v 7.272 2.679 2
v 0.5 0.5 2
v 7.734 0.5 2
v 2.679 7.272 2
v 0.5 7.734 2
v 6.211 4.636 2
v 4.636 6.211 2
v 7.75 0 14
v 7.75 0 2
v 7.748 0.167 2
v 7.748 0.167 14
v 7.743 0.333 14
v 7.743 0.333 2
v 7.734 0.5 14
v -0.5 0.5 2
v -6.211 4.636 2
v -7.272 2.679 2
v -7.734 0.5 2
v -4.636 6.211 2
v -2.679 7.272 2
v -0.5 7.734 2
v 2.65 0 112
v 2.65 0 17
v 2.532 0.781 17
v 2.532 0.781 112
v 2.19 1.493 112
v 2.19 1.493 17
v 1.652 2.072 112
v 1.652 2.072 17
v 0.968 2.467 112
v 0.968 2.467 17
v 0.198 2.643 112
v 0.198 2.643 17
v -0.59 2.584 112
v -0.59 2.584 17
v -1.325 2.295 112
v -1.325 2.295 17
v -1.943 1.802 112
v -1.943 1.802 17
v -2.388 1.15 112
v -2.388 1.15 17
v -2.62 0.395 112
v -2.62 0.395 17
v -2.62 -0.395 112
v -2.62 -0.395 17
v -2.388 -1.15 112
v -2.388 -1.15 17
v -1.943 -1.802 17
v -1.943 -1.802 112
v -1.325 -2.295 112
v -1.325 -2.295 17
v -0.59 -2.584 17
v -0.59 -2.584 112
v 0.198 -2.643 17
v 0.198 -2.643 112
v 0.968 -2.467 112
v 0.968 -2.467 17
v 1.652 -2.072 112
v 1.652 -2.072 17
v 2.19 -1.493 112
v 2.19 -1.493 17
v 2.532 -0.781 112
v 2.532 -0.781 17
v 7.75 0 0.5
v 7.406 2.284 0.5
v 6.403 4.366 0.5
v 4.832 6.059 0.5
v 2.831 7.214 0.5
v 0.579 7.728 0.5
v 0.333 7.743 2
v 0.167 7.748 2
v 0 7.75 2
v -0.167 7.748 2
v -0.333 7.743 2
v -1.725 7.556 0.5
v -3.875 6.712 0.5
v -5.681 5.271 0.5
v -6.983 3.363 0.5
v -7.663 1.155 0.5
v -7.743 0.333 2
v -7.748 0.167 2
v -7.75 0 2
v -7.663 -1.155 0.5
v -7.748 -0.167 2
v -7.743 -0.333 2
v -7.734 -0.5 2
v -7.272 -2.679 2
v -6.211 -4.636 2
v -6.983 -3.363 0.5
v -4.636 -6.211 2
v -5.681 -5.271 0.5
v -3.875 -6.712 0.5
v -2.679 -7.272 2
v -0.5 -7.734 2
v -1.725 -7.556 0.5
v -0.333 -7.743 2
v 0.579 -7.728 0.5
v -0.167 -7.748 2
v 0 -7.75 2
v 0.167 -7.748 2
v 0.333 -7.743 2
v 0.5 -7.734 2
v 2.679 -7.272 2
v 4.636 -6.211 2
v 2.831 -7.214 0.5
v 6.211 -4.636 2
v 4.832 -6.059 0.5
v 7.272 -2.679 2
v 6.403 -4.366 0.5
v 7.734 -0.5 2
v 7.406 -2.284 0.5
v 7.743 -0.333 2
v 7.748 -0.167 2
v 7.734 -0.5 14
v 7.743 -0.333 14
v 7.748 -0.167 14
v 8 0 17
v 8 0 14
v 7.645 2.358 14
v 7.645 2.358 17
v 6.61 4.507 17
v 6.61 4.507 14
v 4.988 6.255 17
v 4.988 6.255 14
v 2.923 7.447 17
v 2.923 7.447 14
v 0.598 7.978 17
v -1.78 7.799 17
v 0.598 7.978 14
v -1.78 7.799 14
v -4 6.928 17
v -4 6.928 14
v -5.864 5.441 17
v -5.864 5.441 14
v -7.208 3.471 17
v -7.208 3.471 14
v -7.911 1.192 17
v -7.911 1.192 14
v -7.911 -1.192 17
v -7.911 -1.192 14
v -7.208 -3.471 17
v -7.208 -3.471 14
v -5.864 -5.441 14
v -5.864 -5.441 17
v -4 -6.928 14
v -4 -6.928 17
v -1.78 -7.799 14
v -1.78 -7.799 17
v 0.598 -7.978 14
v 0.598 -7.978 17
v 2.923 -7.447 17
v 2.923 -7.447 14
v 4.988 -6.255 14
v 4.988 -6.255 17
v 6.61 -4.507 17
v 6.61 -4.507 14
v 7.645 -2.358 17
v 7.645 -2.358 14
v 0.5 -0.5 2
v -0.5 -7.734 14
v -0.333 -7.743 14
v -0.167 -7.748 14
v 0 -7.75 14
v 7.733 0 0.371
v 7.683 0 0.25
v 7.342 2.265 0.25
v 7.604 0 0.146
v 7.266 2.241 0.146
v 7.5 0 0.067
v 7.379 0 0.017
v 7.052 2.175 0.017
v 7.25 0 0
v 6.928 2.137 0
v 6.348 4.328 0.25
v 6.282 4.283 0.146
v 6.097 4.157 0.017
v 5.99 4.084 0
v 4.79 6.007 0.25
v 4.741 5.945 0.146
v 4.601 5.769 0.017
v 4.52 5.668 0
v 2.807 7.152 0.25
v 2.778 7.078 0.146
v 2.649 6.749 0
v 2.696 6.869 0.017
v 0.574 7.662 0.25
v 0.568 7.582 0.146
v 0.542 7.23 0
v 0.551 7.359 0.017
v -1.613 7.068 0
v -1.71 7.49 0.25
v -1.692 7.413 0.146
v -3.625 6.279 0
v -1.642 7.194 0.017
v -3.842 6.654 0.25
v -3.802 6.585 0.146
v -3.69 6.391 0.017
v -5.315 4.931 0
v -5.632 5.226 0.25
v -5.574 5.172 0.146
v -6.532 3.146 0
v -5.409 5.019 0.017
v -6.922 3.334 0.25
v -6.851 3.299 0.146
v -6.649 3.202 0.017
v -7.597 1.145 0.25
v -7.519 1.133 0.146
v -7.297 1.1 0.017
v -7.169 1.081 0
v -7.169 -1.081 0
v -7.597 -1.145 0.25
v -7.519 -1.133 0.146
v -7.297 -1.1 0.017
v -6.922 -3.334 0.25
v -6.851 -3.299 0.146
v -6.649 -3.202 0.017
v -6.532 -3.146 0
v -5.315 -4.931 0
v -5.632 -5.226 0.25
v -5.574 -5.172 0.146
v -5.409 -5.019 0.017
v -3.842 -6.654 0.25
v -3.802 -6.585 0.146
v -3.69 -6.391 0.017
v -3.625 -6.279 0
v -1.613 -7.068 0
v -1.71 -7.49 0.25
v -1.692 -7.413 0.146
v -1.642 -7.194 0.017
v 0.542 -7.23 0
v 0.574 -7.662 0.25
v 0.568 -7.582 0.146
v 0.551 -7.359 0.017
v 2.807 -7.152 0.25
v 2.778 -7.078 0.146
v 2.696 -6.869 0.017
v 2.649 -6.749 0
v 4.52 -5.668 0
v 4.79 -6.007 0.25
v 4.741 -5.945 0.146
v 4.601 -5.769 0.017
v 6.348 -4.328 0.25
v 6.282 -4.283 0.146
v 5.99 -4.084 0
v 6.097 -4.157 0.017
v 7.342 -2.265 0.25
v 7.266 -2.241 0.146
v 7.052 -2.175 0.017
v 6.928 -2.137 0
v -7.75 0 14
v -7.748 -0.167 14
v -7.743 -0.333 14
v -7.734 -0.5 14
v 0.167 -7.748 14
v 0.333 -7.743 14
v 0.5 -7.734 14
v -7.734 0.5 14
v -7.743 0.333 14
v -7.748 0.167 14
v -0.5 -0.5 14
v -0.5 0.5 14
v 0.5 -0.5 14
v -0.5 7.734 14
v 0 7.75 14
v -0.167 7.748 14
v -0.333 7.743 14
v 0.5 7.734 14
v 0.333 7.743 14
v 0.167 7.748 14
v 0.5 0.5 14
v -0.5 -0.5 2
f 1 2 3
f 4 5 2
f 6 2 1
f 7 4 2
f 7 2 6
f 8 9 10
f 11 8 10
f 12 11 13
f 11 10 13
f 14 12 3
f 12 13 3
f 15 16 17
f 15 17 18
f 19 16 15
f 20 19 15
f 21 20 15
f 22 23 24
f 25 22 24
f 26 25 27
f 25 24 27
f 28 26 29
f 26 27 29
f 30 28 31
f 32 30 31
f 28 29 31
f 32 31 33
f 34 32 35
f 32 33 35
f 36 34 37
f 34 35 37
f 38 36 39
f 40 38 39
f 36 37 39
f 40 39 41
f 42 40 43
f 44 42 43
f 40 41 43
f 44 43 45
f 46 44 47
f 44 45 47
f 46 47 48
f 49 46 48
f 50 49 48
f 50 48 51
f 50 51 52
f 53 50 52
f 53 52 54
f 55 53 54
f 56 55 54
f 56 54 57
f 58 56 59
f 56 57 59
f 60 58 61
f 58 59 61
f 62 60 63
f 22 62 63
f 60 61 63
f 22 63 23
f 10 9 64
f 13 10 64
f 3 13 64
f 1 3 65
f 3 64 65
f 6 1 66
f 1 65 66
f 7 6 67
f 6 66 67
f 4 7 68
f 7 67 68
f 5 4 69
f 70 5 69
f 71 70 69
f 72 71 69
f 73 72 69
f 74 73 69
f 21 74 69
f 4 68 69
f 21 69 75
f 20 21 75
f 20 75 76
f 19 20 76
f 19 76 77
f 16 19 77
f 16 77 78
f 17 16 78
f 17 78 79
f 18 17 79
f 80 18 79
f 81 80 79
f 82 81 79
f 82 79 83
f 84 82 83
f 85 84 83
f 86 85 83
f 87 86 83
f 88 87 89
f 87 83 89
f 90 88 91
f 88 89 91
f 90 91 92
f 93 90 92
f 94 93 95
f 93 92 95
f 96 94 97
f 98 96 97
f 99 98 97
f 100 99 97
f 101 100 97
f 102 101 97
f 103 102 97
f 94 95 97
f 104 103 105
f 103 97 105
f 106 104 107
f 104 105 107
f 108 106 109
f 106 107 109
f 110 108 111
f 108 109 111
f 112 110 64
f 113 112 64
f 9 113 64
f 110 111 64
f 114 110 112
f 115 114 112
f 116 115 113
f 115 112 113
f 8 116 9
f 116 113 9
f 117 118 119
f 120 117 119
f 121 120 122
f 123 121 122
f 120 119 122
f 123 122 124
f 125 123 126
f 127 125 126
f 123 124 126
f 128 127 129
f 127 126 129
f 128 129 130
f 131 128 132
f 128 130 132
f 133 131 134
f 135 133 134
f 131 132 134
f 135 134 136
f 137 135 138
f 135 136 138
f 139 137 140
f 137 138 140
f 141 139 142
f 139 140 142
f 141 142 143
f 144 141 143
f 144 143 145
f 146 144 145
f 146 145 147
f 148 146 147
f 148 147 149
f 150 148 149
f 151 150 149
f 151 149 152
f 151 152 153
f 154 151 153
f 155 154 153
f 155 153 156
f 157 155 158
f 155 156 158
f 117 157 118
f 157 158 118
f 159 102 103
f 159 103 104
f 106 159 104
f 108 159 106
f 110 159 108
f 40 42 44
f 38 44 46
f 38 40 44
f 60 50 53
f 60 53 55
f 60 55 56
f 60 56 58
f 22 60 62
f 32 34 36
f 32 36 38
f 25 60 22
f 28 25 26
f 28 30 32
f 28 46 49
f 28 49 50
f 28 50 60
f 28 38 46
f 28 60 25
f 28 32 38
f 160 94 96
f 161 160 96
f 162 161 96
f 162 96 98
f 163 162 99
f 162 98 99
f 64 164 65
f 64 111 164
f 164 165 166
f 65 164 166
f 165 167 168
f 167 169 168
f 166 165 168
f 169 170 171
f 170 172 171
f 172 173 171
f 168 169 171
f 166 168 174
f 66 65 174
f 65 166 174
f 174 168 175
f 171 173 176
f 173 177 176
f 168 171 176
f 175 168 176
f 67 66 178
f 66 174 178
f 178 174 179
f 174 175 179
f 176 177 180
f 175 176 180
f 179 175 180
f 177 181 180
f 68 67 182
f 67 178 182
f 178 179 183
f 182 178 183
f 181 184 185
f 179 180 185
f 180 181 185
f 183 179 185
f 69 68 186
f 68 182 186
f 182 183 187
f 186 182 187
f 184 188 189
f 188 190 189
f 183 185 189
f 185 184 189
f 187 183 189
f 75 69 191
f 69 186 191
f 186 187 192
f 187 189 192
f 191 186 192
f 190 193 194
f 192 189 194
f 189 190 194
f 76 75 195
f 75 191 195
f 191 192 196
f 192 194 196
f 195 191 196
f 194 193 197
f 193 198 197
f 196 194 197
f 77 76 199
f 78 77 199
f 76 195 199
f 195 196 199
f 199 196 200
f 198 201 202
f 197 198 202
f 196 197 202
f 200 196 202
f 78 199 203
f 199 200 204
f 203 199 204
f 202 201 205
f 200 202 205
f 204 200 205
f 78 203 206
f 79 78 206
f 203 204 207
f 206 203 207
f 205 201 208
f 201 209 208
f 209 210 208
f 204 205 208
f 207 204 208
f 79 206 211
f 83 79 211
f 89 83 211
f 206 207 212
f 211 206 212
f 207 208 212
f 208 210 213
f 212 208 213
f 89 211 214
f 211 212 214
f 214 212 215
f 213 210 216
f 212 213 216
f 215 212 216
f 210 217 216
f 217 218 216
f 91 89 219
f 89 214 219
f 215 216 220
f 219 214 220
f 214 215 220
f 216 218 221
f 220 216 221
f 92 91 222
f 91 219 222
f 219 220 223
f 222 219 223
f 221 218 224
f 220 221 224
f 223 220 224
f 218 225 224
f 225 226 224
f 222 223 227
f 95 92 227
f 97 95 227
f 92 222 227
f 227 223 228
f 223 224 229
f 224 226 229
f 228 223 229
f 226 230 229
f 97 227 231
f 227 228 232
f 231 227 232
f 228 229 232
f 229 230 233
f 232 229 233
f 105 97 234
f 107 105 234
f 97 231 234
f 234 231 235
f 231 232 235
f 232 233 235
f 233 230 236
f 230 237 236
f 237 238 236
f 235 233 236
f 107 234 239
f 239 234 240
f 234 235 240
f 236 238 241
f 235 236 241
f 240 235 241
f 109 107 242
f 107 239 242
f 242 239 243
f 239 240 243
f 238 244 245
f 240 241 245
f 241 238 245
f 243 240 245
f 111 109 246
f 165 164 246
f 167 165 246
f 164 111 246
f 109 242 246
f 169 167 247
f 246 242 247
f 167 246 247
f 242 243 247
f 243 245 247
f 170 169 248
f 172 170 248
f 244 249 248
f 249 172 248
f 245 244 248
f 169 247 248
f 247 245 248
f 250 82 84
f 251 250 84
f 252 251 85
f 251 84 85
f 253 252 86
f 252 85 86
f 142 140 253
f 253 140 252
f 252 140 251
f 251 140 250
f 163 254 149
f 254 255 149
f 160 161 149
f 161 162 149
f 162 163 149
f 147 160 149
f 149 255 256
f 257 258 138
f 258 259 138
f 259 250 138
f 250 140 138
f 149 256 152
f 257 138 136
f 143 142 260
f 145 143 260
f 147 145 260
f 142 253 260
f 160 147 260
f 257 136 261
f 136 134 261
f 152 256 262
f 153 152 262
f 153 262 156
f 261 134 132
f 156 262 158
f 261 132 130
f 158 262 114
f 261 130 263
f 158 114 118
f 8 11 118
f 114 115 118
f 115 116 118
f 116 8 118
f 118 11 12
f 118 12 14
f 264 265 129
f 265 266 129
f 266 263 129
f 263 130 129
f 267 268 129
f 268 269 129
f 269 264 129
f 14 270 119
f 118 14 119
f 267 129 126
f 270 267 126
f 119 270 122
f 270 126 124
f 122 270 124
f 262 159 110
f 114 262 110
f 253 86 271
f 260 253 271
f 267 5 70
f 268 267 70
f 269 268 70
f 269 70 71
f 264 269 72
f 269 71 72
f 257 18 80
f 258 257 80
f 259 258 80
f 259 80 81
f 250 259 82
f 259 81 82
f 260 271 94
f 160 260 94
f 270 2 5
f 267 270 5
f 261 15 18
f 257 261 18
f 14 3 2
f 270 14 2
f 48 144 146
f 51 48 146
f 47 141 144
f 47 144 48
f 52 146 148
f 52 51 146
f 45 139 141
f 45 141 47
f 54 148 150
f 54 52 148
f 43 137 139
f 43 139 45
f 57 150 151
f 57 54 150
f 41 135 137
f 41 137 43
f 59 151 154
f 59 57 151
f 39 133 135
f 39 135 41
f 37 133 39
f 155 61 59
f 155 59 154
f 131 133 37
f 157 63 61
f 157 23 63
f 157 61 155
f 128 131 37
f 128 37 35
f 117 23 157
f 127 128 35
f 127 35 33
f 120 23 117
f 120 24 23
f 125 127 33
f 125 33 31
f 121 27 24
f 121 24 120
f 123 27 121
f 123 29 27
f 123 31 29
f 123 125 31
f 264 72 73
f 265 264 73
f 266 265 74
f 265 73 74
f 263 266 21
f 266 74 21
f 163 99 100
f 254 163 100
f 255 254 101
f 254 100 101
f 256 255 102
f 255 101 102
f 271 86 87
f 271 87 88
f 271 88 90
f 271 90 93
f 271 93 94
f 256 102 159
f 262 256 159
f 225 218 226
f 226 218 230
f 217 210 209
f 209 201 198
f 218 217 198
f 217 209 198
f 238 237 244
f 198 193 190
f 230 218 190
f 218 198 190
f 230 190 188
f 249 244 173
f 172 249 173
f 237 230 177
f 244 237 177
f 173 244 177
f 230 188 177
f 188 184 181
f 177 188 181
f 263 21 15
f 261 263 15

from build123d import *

# Parameters (mm, degrees)
F0_R     = 7.75
F1_DEPTH = 2
F3_DEPTH = 12
F4_R     = 8
F5_DEPTH = 3
F6_R     = 0.5
F7_R     = 2.65
F8_DEPTH = 95


with BuildPart() as f1:
    # F0 (on Top) → F1 (new body)
    with BuildSketch(Plane.XY):
        Circle(F0_R)
    extrude(amount=F1_DEPTH)

    # F2 (on face) → F3 (join)
    with BuildSketch(Plane.XY.offset(2)):
        Polygon((0.5, 0), (0.5, 0.5), (0, 0.5), (-0.5, 0.5), (-0.5, 0), (-0.5, -0.5), (0, -0.5), (0.5, -0.5), align=None)
        with BuildLine():
            Line((-0.5, 0), (-0.5, 0.5))
            Line((-0.5, 0.5), (-7.7338541491, 0.5))
            ThreePointArc((-7.7338541491, 0.5), (-7.7459624856, 0.2501303103), (-7.75, 0))
            ThreePointArc((-7.75, 0), (-7.7459624856, -0.2501303103), (-7.7338541491, -0.5))
            Line((-7.7338541491, -0.5), (-0.5, -0.5))
            Line((-0.5, -0.5), (-0.5, 0))
        make_face()
        with BuildLine():
            ThreePointArc((0.5, 7.7338541491), (0.2501303103, 7.7459624856), (0, 7.75))
            ThreePointArc((0, 7.75), (-0.2501303103, 7.7459624856), (-0.5, 7.7338541491))
            Line((-0.5, 7.7338541491), (-0.5, 0.5))
            Line((-0.5, 0.5), (0, 0.5))
            Line((0, 0.5), (0.5, 0.5))
            Line((0.5, 0.5), (0.5, 7.7338541491))
        make_face()
        with BuildLine():
            Line((7.7338541491, 0.5), (0.5, 0.5))
            Line((0.5, 0.5), (0.5, 0))
            Line((0.5, 0), (0.5, -0.5))
            Line((0.5, -0.5), (7.7338541491, -0.5))
            ThreePointArc((7.7338541491, -0.5), (7.7459624856, -0.2501303103), (7.75, 0))
            ThreePointArc((7.75, 0), (7.7459624856, 0.2501303103), (7.7338541491, 0.5))
        make_face()
        with BuildLine():
            Line((0.5, -7.7338541491), (0.5, -0.5))
            Line((0.5, -0.5), (0, -0.5))
            Line((0, -0.5), (-0.5, -0.5))
            Line((-0.5, -0.5), (-0.5, -7.7338541491))
            ThreePointArc((-0.5, -7.7338541491), (-0.2501303103, -7.7459624856), (0, -7.75))
            ThreePointArc((0, -7.75), (0.2501303103, -7.7459624856), (0.5, -7.7338541491))
        make_face()
    extrude(amount=F3_DEPTH)

    # F4 (on face) → F5 (join)
    with BuildSketch(Plane.XY.offset(14)):
        Circle(F4_R)
        with BuildLine():
            Line((-7.7338541491, 0.5), (-0.5, 0.5))
            Line((-0.5, 0.5), (-0.5, 7.7338541491))
            ThreePointArc((-0.5, 7.7338541491), (0, 7.75), (0.5, 7.7338541491))
            Line((0.5, 7.7338541491), (0.5, 0.5))
            Line((0.5, 0.5), (7.7338541491, 0.5))
            ThreePointArc((7.7338541491, 0.5), (7.75, 0), (7.7338541491, -0.5))
            Line((7.7338541491, -0.5), (0.5, -0.5))
            Line((0.5, -0.5), (0.5, -7.7338541491))
            ThreePointArc((0.5, -7.7338541491), (0, -7.75), (-0.5, -7.7338541491))
            Line((-0.5, -7.7338541491), (-0.5, -0.5))
            Line((-0.5, -0.5), (-7.7338541491, -0.5))
            ThreePointArc((-7.7338541491, -0.5), (-7.75, 0), (-7.7338541491, 0.5))
        make_face(mode=Mode.SUBTRACT)
        with BuildLine():
            Line((-0.5, 7.7338541491), (-0.5, 0.5))
            Line((-0.5, 0.5), (-7.7338541491, 0.5))
            ThreePointArc((-7.7338541491, 0.5), (-7.75, 0), (-7.7338541491, -0.5))
            Line((-7.7338541491, -0.5), (-0.5, -0.5))
            Line((-0.5, -0.5), (-0.5, -7.7338541491))
            ThreePointArc((-0.5, -7.7338541491), (0, -7.75), (0.5, -7.7338541491))
            Line((0.5, -7.7338541491), (0.5, -0.5))
            Line((0.5, -0.5), (7.7338541491, -0.5))
            ThreePointArc((7.7338541491, -0.5), (7.75, 0), (7.7338541491, 0.5))
            Line((7.7338541491, 0.5), (0.5, 0.5))
            Line((0.5, 0.5), (0.5, 7.7338541491))
            ThreePointArc((0.5, 7.7338541491), (0, 7.75), (-0.5, 7.7338541491))
        make_face()
    extrude(amount=F5_DEPTH)

    # F6
    f6_edges = [f1.edges().sort_by_distance(p)[0] for p in [
        (-7.75, 0, 0),
    ]]
    fillet(f6_edges, radius=F6_R)

    # F7 (on face) → F8 (join)
    with BuildSketch(Plane.XY.offset(17)):
        Circle(F7_R)
    extrude(amount=F8_DEPTH)


solid = f1.part
